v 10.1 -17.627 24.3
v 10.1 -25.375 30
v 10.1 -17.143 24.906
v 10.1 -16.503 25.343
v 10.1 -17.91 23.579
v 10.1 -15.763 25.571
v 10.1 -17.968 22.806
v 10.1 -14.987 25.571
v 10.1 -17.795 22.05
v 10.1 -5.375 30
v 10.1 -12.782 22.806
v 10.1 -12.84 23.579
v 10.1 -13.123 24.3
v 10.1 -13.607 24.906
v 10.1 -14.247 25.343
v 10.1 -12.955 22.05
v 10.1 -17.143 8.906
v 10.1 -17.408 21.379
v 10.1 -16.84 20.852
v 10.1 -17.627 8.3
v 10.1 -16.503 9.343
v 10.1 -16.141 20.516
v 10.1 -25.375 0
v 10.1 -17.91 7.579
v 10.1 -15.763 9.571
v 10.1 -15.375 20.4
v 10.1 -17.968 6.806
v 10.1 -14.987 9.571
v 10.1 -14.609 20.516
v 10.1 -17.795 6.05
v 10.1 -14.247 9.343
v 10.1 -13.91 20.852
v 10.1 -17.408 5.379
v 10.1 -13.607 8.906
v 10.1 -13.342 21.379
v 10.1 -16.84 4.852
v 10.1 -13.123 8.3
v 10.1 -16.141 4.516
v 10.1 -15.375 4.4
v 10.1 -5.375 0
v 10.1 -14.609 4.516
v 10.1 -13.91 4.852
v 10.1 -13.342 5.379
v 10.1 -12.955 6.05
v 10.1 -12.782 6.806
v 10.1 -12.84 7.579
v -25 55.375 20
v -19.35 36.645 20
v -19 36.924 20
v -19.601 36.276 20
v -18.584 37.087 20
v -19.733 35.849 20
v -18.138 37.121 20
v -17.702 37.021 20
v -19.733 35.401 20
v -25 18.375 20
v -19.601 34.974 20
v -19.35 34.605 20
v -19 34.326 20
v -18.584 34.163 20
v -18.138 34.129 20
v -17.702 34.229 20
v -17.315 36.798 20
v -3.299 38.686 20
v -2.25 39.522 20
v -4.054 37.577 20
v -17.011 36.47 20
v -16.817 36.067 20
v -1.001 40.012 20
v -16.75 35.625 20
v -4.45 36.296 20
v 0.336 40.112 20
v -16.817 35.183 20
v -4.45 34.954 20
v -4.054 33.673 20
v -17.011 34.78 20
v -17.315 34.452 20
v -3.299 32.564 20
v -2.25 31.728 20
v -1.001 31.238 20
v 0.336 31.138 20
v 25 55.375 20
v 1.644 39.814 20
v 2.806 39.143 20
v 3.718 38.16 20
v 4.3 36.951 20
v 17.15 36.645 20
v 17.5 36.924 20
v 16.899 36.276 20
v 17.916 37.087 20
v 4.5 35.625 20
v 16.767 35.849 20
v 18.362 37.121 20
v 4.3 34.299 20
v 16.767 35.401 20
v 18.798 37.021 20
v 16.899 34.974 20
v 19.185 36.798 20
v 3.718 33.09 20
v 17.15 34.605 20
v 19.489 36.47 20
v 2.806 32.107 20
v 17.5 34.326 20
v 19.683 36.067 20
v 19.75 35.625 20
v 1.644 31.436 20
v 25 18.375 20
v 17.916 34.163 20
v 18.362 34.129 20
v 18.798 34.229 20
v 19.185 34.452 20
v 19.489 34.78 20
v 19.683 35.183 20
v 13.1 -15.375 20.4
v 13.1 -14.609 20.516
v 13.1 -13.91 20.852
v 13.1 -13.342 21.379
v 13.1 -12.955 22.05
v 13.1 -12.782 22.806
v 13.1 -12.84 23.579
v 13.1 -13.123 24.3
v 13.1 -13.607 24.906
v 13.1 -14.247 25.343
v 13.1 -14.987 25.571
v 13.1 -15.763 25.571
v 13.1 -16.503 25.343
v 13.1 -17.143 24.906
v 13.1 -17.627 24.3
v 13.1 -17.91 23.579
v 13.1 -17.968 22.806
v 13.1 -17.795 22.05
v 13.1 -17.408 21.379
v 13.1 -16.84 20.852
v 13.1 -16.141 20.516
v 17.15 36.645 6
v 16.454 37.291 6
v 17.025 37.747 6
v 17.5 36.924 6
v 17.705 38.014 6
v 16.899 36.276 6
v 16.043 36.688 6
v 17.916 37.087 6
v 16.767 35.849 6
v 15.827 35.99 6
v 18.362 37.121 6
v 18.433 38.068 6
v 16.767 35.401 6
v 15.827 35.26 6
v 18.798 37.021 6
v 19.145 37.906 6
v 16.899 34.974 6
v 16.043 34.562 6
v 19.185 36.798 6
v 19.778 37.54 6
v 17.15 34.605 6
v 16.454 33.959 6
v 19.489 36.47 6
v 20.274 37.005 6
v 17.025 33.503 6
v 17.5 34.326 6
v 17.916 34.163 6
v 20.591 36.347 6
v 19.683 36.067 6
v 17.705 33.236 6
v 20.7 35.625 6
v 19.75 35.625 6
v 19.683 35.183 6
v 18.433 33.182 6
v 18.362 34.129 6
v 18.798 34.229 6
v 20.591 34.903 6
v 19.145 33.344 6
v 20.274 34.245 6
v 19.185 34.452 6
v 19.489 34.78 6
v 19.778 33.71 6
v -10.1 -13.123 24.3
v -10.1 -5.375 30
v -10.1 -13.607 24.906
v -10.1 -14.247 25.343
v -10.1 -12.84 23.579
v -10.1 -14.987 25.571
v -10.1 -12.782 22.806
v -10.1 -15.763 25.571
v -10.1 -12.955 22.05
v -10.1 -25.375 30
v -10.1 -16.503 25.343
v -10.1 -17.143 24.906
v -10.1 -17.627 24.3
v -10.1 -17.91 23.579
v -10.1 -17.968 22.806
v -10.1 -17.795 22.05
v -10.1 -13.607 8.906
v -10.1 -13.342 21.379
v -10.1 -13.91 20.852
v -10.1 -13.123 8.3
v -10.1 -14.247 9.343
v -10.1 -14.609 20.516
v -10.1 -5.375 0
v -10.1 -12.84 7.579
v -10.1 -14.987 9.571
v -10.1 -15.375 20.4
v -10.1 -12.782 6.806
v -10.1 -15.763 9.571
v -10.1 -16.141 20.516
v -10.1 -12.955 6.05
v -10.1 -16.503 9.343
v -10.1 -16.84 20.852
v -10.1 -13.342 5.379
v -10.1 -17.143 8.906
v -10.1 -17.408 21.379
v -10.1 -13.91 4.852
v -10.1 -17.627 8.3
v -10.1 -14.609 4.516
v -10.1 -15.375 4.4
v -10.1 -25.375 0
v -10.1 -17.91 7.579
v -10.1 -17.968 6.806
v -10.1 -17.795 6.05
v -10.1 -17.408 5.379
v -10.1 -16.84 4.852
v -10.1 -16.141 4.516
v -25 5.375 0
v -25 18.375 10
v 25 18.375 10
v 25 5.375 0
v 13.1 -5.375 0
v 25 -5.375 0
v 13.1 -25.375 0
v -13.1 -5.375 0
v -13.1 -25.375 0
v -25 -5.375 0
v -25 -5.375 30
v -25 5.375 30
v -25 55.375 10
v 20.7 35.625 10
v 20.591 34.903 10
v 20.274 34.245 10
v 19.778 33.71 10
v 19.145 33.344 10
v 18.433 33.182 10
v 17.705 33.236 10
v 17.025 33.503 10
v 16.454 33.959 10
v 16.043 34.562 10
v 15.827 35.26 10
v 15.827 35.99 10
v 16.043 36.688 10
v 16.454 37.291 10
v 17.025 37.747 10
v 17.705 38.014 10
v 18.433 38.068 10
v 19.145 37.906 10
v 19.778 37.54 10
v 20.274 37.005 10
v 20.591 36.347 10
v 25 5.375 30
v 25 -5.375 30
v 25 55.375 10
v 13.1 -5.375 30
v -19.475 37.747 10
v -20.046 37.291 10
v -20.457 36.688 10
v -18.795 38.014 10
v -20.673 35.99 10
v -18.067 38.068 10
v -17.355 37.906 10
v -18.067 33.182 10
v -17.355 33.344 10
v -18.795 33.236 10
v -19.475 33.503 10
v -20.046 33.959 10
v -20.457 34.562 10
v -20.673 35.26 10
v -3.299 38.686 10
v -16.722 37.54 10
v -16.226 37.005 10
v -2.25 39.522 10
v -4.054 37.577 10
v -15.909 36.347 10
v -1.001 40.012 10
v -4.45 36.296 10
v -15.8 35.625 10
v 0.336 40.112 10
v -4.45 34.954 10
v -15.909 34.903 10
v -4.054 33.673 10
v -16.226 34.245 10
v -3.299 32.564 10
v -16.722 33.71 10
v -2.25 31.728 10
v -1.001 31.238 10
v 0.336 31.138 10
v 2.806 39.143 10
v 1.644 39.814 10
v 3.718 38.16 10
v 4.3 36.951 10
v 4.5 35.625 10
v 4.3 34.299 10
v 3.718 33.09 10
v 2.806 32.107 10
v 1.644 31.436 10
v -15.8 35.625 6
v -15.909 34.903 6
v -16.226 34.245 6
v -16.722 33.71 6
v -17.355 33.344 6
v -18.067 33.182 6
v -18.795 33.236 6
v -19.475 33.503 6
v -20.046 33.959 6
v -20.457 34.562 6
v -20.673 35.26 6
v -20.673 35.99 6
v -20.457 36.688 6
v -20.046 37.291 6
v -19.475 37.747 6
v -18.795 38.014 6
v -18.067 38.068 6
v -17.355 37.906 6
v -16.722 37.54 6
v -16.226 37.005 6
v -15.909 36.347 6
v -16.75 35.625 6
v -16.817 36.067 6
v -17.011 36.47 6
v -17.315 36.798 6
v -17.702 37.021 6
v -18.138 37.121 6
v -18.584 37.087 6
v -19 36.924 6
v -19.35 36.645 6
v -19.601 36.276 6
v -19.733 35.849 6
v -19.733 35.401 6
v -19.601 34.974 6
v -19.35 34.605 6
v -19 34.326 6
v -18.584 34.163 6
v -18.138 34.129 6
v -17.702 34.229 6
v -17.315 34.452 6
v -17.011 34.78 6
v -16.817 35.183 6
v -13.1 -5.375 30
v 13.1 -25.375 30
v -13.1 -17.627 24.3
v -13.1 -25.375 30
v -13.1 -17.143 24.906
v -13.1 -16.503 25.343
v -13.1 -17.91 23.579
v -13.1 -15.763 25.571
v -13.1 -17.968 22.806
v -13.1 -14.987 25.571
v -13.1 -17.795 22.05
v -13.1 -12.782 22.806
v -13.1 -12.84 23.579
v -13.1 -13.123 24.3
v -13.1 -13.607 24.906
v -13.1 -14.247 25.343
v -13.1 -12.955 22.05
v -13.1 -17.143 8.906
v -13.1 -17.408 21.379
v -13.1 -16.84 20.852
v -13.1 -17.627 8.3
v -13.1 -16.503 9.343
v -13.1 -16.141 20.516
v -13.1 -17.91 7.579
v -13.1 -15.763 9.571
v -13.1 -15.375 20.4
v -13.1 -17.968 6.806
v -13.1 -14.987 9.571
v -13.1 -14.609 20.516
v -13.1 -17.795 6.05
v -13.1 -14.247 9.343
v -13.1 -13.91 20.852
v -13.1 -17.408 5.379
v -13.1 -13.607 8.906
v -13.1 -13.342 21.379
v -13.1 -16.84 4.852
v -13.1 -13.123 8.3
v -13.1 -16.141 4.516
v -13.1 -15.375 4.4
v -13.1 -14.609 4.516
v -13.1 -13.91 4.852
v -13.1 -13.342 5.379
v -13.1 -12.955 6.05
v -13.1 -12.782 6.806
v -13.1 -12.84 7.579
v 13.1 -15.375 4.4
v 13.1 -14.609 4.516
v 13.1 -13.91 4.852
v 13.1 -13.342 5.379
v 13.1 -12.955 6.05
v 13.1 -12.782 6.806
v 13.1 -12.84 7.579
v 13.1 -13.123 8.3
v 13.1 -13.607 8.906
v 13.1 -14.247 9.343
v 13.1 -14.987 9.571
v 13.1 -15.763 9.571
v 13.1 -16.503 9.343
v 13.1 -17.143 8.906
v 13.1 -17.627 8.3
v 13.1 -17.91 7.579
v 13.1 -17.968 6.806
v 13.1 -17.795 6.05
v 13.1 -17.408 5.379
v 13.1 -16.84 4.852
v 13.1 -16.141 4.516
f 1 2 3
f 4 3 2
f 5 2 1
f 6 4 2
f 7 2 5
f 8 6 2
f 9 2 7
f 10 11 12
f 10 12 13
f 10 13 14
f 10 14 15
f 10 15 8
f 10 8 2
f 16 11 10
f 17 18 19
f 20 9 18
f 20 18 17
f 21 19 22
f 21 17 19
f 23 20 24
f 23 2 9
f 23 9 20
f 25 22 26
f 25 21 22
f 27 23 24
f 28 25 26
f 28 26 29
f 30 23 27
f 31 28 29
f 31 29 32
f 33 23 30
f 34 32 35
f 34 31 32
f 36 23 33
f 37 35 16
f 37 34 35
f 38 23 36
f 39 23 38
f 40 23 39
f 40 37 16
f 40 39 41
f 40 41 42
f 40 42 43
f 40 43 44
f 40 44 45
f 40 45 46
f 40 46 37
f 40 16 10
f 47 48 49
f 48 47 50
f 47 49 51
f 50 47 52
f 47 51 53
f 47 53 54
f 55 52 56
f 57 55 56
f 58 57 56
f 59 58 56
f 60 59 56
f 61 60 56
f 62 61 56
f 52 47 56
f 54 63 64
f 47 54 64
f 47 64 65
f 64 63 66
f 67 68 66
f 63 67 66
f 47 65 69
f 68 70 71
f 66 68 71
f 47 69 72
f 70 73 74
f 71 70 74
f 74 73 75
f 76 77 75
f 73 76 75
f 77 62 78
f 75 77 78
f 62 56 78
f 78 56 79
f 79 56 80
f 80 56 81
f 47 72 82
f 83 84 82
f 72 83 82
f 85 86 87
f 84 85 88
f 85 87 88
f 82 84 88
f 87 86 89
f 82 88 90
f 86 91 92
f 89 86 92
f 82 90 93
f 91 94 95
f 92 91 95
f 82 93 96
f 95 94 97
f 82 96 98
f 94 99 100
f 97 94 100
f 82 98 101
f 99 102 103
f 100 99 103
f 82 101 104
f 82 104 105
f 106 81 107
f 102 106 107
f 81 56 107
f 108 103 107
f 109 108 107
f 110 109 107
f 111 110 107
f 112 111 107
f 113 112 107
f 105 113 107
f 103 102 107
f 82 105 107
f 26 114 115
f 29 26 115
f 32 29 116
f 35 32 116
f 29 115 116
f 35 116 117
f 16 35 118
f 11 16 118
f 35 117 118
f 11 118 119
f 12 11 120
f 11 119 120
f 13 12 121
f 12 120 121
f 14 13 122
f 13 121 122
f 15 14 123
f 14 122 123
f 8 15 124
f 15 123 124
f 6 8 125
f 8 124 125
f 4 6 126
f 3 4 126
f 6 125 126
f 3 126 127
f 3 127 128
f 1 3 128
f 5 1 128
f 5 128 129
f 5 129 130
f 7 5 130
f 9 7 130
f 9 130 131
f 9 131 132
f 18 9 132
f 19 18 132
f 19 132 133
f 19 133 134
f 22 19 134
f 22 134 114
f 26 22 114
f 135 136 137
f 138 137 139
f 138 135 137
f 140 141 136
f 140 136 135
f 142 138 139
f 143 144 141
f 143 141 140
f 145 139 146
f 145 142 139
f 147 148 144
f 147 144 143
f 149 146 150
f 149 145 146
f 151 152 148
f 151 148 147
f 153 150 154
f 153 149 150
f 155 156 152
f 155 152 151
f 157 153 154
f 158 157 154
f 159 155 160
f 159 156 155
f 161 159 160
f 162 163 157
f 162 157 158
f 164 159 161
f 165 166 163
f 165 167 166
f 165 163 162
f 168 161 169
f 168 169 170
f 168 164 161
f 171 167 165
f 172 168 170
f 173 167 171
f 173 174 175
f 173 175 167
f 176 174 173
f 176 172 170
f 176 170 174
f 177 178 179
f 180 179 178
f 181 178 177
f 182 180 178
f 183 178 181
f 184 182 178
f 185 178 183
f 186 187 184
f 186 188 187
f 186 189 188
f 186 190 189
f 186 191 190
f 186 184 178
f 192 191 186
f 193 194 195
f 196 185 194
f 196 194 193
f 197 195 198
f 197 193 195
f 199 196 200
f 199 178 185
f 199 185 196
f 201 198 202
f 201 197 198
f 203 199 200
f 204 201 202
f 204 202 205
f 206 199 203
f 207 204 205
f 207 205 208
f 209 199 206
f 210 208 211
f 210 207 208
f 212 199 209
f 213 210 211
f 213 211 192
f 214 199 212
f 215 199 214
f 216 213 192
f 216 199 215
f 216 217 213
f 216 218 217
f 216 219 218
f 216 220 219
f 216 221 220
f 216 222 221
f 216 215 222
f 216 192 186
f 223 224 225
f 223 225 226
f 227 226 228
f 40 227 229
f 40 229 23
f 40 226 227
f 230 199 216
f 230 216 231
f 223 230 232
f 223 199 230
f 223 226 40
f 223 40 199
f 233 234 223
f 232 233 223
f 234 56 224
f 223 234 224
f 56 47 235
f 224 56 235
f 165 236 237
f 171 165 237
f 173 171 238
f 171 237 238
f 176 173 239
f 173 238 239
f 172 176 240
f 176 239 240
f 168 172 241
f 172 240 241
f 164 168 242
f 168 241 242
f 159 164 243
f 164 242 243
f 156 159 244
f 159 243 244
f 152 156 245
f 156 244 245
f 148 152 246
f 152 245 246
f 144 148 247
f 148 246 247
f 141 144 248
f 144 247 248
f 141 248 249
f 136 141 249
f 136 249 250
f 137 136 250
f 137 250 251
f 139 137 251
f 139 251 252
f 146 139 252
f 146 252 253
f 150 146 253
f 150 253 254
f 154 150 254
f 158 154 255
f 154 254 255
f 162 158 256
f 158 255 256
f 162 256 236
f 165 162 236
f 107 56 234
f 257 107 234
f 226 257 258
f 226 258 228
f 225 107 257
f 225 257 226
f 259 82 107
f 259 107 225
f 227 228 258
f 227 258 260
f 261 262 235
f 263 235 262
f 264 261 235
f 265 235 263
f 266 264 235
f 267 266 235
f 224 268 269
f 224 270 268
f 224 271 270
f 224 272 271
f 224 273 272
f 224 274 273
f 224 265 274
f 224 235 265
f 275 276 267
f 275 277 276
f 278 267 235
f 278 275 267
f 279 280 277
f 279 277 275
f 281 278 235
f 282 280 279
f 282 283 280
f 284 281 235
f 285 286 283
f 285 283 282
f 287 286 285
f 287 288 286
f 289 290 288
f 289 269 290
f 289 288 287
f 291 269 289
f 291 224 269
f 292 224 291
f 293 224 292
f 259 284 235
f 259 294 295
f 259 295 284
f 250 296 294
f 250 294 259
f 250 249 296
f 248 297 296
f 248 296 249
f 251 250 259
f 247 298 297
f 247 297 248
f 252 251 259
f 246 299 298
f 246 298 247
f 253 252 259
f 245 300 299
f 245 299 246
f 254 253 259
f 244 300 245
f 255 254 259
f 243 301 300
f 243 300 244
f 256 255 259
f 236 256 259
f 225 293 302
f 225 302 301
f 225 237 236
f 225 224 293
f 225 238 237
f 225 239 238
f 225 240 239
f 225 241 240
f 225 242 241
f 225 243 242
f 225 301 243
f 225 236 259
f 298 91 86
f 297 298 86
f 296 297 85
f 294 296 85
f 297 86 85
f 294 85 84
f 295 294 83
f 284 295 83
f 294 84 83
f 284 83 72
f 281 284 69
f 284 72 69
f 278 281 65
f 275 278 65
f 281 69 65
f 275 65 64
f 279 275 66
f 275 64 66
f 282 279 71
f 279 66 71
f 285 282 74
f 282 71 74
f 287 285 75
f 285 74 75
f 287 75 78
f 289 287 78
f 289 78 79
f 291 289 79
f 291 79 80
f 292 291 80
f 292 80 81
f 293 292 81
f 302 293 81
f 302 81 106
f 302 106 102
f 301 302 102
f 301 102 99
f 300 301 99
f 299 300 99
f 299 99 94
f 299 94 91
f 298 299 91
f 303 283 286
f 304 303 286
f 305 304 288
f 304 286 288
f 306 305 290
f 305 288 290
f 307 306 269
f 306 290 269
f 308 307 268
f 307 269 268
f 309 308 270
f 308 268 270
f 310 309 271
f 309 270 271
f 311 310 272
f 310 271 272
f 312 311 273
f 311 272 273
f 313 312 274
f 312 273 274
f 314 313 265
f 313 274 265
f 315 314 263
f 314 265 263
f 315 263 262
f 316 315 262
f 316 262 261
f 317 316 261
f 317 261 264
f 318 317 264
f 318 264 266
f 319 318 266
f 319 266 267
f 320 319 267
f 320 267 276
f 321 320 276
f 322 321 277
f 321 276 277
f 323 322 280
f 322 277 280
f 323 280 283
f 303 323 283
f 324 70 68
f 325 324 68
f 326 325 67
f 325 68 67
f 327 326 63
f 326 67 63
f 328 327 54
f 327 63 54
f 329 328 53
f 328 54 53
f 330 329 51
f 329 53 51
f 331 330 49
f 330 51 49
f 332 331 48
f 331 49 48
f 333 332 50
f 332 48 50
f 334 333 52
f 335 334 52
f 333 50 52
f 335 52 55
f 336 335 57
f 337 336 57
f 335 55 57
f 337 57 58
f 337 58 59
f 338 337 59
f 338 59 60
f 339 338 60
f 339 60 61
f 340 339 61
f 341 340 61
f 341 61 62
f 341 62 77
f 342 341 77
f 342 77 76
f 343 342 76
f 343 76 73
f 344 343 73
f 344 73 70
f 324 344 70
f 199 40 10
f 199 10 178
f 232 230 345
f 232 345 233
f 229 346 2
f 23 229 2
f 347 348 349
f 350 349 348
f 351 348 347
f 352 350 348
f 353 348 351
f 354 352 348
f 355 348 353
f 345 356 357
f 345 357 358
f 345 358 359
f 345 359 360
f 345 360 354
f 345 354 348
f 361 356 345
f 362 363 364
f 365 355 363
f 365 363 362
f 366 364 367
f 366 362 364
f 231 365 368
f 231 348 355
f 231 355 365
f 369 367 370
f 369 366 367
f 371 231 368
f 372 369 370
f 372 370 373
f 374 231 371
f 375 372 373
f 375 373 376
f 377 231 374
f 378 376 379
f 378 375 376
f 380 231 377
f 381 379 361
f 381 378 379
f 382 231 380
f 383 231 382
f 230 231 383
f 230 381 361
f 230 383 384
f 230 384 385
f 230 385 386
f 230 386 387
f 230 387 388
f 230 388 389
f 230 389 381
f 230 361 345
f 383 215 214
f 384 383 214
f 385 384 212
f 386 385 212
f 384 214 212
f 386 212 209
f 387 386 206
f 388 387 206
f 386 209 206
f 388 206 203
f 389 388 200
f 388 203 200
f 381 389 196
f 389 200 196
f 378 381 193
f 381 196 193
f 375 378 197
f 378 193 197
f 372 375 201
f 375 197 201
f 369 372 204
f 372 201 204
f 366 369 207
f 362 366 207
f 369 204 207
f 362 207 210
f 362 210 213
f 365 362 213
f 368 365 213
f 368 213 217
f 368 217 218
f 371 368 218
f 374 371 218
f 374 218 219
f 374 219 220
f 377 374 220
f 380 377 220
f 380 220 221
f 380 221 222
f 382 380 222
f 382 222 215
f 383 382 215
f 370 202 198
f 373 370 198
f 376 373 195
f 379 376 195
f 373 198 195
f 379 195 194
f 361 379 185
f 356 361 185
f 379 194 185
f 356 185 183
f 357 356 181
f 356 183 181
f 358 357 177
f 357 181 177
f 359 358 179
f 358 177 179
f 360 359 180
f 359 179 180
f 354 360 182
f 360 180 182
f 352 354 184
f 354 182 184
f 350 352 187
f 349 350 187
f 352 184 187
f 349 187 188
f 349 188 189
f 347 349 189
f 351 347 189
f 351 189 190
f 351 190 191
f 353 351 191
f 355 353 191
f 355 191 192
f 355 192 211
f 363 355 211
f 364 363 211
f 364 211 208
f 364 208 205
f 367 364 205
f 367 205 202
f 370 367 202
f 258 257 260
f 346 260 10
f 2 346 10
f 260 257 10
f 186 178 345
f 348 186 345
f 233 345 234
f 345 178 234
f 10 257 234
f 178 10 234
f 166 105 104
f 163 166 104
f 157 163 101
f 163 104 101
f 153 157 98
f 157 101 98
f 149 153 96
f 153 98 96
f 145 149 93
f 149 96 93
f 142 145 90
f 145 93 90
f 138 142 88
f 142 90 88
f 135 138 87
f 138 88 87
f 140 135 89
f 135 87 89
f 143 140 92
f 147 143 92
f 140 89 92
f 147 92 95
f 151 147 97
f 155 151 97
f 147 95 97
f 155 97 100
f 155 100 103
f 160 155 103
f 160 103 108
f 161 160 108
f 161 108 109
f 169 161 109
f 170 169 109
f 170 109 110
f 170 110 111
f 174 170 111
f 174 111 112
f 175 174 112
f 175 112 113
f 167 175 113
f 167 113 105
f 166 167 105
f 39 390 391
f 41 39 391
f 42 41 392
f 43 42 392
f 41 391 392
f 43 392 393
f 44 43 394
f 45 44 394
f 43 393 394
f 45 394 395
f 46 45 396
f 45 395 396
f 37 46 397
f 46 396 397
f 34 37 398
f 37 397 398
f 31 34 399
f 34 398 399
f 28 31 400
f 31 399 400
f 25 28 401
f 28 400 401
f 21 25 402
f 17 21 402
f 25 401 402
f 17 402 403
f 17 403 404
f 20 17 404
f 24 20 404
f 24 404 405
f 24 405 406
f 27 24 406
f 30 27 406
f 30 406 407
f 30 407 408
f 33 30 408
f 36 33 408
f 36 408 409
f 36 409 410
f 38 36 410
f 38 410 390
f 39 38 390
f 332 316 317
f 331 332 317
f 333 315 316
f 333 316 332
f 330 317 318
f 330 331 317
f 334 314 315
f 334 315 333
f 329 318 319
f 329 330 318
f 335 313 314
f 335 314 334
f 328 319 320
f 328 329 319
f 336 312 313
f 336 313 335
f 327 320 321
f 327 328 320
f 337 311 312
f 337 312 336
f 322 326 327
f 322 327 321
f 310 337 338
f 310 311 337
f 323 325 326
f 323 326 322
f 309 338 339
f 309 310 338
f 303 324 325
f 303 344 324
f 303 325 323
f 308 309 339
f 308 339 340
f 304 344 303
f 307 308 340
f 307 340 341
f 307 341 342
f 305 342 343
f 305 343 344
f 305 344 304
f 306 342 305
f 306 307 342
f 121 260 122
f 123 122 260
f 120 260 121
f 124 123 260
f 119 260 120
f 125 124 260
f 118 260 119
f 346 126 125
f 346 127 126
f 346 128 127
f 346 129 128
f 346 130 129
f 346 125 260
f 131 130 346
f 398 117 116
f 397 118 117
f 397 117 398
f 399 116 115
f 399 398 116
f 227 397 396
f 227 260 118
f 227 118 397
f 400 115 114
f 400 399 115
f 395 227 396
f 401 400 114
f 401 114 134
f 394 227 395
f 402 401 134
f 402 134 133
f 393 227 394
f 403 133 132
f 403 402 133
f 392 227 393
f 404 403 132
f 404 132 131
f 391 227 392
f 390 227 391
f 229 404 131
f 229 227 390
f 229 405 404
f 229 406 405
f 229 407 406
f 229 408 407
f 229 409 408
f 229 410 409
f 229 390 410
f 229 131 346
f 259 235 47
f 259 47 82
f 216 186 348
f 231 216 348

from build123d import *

# Parameters (mm, degrees)
EXTRUDE_1_DEPTH = 30
SKETCH_2_W      = 50
SKETCH_2_H      = 10
EXTRUDE_2_DEPTH = 50
HOLE_WIZARD_2_D = 5.2
HOLE_WIZARD_3_D = 9
SKETCH_17_R     = 2.45
EXTRUDE_6_DEPTH = 4
HOLE_WIZARD_5_D = 3
EXTRUDE_7_DEPTH = 50


with BuildPart() as part:
    # 草图1 → 凸台-拉伸1 (new body)
    with BuildSketch(Plane.XY):
        Polygon((13.1, -5.375), (13.1, -25.375), (10.1, -25.375), (10.1, -5.375), (-10.1, -5.375), (-10.1, -25.375), (-13.1, -25.375), (-13.1, -5.375), (-25, -5.375), (-25, 5.375), (25, 5.375), (25, -5.375), align=None)
    extrude(amount=EXTRUDE_1_DEPTH)

    # 草图2 → 凸台-拉伸2 (add)
    with BuildSketch(Plane(origin=(0, 5.375, 0), x_dir=(1, 0, 0), z_dir=(0, 1, 0))):
        with Locations((0, -15)):
            Rectangle(SKETCH_2_W, SKETCH_2_H)
    extrude(amount=EXTRUDE_2_DEPTH)

    # 孔2 (through all)
    with Locations(Plane.ZY.offset(13.1)):
        with Locations((7, -15.375), (23, -15.375)):
            Hole(HOLE_WIZARD_2_D / 2)

    # 孔3 (through all)
    with Locations(Plane(origin=(0, 0, 10), x_dir=(-1, 0, 0), z_dir=(0, 0, -1))):
        with Locations((0, 35.625)):
            Hole(HOLE_WIZARD_3_D / 2)

    # 草图17 → 凸台-拉伸6 (add)
    with BuildSketch(Plane(origin=(0, 0, 10), x_dir=(-1, 0, 0), z_dir=(0, 0, -1))):
        with Locations(Location((18.25, 35.625, 0), (0, 0, 180))):
            Circle(SKETCH_17_R)
        with Locations(Location((-18.25, 35.625, 0), (0, 0, 180))):
            Circle(SKETCH_17_R)
    extrude(amount=EXTRUDE_6_DEPTH)

    # 孔5 (through all)
    with Locations(Plane(origin=(0, 0, 6), x_dir=(-1, 0, 0), z_dir=(0, 0, -1))):
        with Locations((18.25, 35.625), (-18.25, 35.625)):
            Hole(HOLE_WIZARD_5_D / 2)

    # 草图20 → 凸台-拉伸7 (add)
    with BuildSketch(Plane.ZY.offset(25)):
        Polygon((20, 18.375), (30, 5.375), (20, 5.375), align=None)
        Polygon((10, 18.375), (0, 5.375), (10, 5.375), align=None)
    extrude(amount=-EXTRUDE_7_DEPTH)


solid = part.part
